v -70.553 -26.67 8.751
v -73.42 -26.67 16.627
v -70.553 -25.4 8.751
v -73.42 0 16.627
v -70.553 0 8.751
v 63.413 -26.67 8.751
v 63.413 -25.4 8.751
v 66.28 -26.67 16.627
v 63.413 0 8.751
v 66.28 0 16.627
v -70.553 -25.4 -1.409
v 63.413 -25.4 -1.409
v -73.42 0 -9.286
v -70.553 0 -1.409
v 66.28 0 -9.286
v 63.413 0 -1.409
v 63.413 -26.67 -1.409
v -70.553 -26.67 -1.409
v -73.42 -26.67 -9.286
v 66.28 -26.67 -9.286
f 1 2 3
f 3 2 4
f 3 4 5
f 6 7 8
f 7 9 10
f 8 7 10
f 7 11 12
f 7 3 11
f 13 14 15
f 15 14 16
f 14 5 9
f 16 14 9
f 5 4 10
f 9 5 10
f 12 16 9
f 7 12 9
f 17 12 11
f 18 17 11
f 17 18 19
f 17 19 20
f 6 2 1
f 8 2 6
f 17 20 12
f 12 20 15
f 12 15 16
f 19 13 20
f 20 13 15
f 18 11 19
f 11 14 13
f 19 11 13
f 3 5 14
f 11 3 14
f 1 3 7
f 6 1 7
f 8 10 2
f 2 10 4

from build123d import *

# Parameters (mm, degrees)
F1_DEPTH = 25.4
F3_DEPTH = 1.27
F4_DEPTH = 1.27


with BuildPart() as f1:
    # F0 (on Front) → F1 (new body)
    with BuildSketch(Plane.XZ):
        Polygon((66.279829, 16.627325), (-73.420171, 16.627325), (-70.553358, 8.750822), (-70.553358, -1.409178), (-73.420171, -9.285682), (66.279829, -9.285682), (63.413016, -1.409178), (63.413016, 8.750822), align=None)
    extrude(amount=F1_DEPTH)

    # F2 (on face) → F3 (join)
    with BuildSketch(Plane.XZ.offset(25.4)):
        Polygon((-73.420171, 16.627325), (-70.553358, 8.750822), (63.413016, 8.750822), (66.279829, 16.627325), align=None)
    extrude(amount=F3_DEPTH)

    # F2 (on face) → F4 (join)
    with BuildSketch(Plane.XZ.offset(25.4)):
        Polygon((63.413016, -1.409178), (-70.553358, -1.409178), (-73.420171, -9.285682), (66.279829, -9.285682), align=None)
    extrude(amount=F4_DEPTH)


solid = f1.part
